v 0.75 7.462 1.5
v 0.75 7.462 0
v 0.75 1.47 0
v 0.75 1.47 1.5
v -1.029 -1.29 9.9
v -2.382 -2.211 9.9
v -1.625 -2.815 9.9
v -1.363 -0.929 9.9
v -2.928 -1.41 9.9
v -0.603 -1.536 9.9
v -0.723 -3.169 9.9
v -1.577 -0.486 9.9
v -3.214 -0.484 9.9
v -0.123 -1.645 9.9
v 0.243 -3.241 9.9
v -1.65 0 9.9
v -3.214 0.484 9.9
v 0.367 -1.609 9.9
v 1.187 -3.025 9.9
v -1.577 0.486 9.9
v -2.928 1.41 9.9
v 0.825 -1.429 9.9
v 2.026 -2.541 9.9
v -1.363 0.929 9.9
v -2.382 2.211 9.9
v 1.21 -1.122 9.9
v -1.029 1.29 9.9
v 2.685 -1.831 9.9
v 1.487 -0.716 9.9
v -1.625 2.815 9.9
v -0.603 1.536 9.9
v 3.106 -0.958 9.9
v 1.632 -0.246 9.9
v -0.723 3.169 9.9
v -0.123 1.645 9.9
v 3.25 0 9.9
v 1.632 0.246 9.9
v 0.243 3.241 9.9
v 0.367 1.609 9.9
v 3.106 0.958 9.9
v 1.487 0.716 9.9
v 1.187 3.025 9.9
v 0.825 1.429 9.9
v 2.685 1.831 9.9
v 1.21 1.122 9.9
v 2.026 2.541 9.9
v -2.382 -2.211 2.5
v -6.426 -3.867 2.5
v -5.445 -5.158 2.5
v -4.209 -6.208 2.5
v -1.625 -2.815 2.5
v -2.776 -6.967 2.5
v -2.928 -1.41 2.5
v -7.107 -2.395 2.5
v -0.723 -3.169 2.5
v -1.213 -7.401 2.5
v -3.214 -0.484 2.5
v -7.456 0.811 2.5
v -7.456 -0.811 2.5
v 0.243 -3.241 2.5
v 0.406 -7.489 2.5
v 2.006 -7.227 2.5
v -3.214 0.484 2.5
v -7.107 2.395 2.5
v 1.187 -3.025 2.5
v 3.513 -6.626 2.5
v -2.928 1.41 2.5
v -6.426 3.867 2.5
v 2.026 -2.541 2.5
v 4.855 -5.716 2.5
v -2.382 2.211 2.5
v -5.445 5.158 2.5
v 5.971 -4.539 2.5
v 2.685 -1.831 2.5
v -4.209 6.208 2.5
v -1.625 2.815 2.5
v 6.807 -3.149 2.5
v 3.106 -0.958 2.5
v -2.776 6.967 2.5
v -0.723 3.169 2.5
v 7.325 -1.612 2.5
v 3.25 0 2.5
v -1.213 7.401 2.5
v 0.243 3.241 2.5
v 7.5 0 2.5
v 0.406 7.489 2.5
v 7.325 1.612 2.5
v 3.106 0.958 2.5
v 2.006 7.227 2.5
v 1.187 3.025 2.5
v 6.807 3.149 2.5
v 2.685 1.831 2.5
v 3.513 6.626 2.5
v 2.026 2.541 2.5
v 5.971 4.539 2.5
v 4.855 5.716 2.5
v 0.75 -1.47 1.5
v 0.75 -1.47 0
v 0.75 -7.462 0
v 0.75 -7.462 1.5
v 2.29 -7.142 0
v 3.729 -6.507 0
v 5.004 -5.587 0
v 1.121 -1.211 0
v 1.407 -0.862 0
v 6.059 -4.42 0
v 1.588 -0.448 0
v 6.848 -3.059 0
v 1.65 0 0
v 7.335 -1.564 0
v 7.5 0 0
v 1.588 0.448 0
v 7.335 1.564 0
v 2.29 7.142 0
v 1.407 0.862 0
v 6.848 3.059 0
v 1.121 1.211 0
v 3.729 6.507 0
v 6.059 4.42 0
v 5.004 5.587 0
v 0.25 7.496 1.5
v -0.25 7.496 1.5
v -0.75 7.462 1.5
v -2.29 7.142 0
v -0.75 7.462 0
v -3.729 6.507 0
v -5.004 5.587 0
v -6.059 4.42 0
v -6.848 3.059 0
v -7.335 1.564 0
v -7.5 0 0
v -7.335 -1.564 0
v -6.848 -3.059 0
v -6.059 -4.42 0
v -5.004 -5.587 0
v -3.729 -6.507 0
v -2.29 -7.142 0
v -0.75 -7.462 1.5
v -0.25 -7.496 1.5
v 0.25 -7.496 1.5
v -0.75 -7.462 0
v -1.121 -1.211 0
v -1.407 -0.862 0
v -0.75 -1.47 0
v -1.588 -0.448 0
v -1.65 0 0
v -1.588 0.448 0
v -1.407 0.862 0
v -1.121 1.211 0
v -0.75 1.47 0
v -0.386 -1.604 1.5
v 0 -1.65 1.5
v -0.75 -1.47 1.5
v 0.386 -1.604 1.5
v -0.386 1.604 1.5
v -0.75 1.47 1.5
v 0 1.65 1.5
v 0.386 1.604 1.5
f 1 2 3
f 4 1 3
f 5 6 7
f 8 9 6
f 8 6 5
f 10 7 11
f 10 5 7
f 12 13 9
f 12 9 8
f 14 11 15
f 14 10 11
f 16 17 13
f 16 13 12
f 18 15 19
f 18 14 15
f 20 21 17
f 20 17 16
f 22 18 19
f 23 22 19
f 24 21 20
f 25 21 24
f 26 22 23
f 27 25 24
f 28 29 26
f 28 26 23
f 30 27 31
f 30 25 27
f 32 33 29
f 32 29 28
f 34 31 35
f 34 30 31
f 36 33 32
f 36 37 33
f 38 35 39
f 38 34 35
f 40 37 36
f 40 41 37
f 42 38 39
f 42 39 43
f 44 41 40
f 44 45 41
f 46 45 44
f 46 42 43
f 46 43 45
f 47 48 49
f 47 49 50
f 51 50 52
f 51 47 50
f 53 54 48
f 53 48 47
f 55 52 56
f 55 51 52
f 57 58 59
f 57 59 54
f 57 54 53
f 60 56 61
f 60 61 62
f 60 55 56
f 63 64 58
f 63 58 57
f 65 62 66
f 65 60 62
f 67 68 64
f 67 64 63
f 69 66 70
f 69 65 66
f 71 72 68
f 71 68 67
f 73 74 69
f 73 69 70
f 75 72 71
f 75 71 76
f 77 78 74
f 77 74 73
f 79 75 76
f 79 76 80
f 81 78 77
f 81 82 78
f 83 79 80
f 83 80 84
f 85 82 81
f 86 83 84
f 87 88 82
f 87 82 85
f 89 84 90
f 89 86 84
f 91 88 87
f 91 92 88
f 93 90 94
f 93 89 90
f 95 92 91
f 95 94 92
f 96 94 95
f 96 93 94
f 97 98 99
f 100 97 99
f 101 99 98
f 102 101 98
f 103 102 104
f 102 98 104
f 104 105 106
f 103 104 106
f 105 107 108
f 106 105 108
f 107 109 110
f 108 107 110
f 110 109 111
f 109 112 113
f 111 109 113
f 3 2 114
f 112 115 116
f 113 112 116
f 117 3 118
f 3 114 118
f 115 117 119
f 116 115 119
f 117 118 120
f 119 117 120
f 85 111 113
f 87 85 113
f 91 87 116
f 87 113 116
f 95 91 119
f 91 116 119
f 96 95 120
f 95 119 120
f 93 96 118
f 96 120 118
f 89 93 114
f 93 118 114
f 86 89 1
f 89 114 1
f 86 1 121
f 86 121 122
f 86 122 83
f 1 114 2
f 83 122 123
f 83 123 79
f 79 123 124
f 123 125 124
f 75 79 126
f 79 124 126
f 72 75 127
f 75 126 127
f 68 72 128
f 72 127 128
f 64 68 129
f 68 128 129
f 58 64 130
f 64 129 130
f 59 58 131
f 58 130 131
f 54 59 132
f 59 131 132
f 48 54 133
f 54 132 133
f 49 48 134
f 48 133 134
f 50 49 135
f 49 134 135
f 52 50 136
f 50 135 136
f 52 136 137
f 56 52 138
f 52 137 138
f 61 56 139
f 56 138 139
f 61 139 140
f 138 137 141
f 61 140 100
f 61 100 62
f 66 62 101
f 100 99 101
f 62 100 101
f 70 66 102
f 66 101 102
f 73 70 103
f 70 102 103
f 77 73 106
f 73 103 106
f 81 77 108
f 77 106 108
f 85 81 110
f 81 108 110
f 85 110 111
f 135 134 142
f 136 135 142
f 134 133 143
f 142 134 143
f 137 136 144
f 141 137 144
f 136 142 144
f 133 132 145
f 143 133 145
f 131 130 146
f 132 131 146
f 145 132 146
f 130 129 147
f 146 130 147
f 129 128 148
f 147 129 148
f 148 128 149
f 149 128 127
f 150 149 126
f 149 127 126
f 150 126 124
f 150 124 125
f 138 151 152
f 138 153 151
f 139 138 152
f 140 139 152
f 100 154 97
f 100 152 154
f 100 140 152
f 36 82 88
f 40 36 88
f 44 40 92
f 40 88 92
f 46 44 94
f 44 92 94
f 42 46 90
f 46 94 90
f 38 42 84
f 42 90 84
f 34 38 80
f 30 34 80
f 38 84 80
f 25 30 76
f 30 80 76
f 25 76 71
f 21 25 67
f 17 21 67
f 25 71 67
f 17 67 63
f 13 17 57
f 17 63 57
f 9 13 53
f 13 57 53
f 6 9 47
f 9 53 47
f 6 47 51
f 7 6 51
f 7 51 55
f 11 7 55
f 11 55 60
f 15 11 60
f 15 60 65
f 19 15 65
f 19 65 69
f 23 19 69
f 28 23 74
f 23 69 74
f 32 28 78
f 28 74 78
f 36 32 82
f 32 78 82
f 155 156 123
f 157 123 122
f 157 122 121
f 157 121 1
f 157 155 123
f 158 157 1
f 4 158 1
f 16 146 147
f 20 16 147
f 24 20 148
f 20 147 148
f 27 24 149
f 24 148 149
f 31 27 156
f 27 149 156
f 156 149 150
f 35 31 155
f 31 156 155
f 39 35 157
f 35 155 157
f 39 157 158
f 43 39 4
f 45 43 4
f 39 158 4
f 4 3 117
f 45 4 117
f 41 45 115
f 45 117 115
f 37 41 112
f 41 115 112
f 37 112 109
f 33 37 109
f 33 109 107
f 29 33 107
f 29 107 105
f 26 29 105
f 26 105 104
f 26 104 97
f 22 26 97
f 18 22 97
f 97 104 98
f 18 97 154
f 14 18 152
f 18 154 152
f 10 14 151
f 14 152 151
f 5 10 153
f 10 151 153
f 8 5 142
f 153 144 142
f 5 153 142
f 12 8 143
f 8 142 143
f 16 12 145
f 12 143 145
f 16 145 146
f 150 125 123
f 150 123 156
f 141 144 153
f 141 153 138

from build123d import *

# Parameters (mm, degrees)
F0_R     = 7.5
F1_DEPTH = 2.5
F2_R     = 3.25
F3_DEPTH = 7.4
F4_W     = 1.5
F4_H     = 16
F5_DEPTH = 1.5
F7_D     = 3.3


with BuildPart() as f1:
    # F0 (on Top) → F1 (new body)
    with BuildSketch(Plane.XY):
        Circle(F0_R)
    extrude(amount=F1_DEPTH)

    # F2 (on face) → F3 (join)
    with BuildSketch(Plane.XY.offset(2.5)):
        Circle(F2_R)
    extrude(amount=F3_DEPTH)

    # F4 (on face) → F5 (cut)
    with BuildSketch(Plane(origin=(0, 0, 0), x_dir=(1, 0, 0), z_dir=(0, 0, -1))):
        Rectangle(F4_W, F4_H)
    extrude(amount=-F5_DEPTH, mode=Mode.SUBTRACT)

    # F7 (through all)
    with Locations(Plane.XY.offset(9.9)):
        with Locations((0, 0)):
            Hole(F7_D / 2)


solid = f1.part
